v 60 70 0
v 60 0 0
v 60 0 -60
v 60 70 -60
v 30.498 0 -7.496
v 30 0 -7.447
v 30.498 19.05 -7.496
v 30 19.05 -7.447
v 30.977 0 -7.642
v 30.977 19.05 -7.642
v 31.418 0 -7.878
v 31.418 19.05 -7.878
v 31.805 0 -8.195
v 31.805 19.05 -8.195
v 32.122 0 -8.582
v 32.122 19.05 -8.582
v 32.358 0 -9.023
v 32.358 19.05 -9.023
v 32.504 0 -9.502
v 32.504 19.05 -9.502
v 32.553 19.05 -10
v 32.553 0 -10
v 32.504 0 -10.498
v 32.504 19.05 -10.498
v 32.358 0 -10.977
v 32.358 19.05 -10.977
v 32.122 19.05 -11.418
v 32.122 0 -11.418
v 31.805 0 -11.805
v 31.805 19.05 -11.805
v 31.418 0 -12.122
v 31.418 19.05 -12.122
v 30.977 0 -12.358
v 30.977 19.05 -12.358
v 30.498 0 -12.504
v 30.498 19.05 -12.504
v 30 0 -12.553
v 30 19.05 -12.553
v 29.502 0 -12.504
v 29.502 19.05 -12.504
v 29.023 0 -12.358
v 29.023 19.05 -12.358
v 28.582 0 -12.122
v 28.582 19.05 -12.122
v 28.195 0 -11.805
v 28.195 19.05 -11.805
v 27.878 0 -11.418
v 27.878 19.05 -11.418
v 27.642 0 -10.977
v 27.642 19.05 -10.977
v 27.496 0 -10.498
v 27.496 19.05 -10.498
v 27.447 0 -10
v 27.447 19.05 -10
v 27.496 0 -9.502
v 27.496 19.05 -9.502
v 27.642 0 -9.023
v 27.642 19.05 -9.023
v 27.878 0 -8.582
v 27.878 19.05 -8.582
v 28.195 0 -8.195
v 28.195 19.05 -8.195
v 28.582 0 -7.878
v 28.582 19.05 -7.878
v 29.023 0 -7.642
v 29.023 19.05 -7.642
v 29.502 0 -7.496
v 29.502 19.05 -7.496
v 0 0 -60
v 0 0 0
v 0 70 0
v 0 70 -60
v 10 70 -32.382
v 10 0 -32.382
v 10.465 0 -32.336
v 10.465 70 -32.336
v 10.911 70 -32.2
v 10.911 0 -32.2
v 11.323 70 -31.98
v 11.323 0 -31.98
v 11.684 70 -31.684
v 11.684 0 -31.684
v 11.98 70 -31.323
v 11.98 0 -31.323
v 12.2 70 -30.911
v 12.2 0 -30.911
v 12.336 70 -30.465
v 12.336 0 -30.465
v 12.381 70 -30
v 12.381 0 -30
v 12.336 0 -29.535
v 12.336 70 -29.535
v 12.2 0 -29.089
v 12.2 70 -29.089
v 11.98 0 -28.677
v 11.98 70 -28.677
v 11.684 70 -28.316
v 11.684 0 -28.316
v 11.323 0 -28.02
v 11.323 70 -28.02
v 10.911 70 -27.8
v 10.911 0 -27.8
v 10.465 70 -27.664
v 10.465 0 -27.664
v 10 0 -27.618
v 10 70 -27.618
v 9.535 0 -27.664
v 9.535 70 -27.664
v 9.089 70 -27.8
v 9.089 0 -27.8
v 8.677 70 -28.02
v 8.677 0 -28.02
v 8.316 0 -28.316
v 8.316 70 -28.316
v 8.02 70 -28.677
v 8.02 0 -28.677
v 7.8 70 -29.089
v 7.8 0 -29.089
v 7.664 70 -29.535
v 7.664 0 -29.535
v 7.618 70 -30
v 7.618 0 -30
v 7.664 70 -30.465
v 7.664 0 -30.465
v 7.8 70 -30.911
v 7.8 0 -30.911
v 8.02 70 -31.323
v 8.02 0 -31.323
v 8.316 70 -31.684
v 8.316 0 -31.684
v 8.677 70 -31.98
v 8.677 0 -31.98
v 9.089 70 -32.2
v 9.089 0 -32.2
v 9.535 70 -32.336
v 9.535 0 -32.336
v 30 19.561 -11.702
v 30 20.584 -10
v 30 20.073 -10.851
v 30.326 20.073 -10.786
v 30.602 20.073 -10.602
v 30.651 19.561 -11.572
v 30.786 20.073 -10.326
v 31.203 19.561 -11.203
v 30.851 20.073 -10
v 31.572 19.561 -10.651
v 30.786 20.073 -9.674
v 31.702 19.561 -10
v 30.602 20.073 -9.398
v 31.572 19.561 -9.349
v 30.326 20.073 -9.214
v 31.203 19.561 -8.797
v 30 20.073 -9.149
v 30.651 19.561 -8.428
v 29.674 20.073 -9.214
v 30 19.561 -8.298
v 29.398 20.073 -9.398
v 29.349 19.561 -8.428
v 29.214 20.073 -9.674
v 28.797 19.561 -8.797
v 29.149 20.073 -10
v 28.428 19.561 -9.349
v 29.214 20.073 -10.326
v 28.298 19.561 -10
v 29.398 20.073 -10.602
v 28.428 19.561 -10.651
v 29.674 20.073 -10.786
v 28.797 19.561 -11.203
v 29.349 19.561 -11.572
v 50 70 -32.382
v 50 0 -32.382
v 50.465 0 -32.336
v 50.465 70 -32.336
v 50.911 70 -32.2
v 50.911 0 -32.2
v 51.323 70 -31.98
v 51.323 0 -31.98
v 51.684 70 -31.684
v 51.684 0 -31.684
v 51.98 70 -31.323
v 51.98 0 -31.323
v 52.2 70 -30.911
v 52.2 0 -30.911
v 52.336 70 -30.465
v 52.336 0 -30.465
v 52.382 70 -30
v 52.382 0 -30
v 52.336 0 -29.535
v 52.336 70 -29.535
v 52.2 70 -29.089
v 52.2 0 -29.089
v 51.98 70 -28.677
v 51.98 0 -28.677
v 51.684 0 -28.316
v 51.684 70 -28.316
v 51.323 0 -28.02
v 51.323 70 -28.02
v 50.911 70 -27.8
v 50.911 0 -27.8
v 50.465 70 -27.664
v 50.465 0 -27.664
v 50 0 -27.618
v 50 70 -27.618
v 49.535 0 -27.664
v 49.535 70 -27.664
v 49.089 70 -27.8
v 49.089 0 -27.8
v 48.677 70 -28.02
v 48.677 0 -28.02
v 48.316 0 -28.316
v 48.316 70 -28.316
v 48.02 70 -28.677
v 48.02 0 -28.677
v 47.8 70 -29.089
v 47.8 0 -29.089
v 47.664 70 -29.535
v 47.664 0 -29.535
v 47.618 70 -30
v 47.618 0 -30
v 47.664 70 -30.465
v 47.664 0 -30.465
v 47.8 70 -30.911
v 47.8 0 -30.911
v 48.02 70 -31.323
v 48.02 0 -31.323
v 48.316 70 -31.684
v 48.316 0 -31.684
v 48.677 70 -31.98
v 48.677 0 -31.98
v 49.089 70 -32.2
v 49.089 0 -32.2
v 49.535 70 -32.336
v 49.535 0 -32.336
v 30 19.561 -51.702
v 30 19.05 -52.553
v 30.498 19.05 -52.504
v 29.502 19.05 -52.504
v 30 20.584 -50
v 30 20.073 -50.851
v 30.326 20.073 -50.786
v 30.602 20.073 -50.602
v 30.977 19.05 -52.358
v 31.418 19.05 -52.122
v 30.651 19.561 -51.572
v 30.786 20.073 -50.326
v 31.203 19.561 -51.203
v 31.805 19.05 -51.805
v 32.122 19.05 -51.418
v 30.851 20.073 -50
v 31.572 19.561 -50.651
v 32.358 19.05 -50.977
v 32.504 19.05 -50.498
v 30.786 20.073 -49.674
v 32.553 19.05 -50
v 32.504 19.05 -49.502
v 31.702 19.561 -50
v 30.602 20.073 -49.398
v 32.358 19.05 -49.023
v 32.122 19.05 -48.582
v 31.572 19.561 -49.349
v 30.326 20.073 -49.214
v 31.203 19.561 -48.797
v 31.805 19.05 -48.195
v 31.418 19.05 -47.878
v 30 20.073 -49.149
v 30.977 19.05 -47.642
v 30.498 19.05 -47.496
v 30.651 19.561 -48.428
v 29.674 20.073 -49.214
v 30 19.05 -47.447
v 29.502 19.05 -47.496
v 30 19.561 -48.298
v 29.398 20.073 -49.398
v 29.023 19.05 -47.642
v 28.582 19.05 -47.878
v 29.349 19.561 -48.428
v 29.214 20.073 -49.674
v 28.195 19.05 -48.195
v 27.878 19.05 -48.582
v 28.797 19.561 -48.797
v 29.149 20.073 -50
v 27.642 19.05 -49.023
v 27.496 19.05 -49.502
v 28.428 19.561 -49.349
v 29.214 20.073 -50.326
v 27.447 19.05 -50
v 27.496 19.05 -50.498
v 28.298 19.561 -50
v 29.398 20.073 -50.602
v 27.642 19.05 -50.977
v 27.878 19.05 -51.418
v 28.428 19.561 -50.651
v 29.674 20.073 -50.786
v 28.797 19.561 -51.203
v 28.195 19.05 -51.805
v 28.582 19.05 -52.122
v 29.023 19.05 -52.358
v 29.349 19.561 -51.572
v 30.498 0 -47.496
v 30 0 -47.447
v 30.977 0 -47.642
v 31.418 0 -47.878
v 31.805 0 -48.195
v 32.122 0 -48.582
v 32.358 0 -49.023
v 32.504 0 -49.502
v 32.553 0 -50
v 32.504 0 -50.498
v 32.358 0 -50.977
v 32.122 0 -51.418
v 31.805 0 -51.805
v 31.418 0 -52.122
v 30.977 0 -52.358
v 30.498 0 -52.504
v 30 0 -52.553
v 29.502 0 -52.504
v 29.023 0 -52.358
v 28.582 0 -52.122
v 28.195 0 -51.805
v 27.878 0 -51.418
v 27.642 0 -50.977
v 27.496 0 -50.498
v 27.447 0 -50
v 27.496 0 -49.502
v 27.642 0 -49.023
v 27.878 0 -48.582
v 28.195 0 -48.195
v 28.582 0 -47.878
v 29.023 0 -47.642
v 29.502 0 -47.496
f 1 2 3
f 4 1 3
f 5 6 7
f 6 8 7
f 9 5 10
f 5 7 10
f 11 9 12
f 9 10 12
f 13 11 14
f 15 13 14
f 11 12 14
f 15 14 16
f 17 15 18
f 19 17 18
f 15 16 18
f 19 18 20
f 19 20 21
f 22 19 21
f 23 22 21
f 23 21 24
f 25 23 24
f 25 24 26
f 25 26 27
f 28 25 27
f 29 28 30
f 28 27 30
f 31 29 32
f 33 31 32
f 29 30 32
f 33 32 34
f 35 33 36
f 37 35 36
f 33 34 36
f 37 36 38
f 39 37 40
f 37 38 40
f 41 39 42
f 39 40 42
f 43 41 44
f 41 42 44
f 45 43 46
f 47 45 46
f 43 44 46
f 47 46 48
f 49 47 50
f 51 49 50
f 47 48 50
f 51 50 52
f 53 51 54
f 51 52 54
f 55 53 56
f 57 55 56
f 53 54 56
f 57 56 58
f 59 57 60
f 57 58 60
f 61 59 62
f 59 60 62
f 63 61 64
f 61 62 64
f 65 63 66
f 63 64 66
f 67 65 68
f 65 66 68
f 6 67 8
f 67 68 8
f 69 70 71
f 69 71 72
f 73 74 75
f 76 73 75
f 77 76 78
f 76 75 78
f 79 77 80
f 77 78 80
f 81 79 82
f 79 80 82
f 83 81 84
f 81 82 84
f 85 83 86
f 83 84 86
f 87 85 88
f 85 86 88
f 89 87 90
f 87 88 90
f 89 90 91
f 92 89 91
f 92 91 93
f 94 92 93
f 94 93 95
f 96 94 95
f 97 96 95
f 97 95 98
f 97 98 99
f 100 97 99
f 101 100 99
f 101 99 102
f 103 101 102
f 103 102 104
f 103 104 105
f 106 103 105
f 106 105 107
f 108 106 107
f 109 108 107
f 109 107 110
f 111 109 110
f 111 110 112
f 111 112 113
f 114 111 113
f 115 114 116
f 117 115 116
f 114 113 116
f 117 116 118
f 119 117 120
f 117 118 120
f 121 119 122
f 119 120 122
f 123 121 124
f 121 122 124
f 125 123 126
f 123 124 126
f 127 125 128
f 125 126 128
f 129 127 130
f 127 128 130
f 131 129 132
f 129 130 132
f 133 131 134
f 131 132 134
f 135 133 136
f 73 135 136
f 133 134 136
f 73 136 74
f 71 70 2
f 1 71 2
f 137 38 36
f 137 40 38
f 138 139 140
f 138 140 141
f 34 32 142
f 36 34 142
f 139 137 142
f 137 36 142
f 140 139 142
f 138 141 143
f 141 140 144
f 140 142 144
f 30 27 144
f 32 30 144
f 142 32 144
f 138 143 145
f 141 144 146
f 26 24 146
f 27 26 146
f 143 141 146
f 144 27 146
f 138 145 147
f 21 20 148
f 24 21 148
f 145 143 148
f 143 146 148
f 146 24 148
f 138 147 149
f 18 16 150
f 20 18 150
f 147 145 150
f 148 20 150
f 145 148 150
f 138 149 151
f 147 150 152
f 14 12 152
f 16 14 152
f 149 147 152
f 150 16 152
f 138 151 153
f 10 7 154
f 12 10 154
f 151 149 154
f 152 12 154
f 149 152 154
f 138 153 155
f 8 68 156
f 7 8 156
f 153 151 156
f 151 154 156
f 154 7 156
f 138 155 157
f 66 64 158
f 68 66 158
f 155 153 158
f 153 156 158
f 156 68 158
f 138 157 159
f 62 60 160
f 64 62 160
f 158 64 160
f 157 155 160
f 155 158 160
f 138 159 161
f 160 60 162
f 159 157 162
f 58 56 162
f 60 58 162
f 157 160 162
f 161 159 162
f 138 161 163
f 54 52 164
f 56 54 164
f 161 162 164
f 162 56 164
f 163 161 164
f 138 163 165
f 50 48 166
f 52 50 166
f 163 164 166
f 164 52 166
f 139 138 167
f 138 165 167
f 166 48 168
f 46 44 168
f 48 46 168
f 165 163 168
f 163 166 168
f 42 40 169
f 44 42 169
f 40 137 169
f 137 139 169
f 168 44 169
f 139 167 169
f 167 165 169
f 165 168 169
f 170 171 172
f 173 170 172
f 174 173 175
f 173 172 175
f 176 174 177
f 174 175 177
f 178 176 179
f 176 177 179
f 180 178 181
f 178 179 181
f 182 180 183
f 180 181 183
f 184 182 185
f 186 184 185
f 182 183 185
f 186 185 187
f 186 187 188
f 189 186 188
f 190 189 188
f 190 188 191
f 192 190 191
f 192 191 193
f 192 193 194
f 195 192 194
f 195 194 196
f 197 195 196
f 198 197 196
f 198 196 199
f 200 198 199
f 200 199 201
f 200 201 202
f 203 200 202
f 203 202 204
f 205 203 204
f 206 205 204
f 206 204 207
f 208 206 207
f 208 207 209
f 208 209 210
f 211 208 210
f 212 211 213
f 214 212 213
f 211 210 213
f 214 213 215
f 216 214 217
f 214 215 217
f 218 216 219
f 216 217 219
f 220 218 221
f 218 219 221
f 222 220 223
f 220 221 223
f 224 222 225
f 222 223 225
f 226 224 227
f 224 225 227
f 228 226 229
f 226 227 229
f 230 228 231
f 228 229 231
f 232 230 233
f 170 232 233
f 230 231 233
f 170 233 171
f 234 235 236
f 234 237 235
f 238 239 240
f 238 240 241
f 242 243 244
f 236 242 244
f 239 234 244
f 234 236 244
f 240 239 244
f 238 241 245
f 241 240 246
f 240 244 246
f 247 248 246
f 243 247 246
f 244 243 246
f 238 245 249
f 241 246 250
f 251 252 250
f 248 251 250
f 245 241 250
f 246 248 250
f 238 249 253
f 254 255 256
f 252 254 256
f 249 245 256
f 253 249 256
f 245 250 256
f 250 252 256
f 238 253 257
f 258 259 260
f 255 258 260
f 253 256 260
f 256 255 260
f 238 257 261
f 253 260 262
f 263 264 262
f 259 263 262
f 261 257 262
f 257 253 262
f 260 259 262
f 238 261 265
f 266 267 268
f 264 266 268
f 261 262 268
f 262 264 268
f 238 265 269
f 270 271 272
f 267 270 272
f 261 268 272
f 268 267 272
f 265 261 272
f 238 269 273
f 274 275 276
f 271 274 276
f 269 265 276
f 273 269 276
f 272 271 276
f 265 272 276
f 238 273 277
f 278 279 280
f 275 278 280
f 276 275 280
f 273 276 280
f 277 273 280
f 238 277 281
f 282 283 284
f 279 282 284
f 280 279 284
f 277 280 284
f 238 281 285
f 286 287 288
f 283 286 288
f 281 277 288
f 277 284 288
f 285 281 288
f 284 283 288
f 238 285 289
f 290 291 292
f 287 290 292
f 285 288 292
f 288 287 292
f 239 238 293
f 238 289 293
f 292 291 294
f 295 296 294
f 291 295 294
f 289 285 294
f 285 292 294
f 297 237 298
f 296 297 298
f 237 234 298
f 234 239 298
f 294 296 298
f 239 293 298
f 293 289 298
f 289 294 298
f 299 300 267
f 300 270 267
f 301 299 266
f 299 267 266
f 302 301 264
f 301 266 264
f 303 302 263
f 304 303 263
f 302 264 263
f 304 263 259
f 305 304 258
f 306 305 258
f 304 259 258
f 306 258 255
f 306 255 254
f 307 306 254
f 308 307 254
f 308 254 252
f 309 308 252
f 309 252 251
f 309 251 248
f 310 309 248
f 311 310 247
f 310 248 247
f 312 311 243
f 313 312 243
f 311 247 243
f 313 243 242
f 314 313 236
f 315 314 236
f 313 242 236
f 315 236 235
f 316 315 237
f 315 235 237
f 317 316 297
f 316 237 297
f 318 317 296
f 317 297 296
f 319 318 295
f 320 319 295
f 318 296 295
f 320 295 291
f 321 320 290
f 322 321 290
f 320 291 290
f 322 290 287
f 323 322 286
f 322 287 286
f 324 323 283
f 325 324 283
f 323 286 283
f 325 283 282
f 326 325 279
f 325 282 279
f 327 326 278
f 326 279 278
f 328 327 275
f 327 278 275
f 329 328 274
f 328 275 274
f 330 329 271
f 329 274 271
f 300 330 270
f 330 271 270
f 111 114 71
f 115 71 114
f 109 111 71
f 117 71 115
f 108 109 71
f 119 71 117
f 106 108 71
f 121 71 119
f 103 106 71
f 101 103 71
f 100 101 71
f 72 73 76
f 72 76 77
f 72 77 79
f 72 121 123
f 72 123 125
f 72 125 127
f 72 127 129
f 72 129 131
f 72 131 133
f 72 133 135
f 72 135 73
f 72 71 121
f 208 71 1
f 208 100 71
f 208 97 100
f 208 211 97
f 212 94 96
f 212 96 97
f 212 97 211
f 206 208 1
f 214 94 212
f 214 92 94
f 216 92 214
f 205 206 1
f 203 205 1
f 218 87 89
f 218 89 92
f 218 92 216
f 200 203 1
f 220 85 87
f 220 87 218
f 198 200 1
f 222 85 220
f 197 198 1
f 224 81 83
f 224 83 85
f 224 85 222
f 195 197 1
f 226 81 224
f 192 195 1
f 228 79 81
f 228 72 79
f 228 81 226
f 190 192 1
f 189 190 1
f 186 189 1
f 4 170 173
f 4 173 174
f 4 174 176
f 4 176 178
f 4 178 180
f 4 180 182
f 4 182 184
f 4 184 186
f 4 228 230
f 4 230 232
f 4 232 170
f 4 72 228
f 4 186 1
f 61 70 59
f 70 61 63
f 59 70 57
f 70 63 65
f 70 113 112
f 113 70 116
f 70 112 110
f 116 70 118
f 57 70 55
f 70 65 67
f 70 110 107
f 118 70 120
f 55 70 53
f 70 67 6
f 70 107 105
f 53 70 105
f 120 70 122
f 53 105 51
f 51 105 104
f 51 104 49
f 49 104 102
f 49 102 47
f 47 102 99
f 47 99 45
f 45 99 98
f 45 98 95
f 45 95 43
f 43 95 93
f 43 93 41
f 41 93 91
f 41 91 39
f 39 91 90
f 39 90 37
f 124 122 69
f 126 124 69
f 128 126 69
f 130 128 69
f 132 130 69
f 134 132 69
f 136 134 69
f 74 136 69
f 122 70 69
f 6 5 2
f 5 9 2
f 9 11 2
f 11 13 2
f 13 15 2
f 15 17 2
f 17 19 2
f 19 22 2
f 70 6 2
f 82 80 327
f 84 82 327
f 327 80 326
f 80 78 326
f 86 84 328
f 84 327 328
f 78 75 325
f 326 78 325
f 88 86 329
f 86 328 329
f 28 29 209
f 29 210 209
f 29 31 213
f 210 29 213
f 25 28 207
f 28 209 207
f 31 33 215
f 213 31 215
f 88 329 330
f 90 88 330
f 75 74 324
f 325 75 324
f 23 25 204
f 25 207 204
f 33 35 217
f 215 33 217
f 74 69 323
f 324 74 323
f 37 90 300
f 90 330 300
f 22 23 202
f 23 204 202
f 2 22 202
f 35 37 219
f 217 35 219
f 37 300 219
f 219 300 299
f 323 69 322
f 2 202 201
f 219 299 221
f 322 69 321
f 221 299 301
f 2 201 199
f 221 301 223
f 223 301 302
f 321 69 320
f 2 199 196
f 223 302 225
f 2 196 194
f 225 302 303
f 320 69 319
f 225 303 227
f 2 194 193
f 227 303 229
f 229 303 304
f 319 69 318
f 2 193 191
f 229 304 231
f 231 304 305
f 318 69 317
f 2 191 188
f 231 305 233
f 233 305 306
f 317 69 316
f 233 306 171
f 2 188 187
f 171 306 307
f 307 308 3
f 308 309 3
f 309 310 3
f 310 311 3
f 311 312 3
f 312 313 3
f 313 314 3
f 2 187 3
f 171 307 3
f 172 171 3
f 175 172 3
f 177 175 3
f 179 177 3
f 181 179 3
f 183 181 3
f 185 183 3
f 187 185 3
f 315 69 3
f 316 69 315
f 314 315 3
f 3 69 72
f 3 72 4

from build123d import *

# Parameters (mm, degrees)
SKETCH1_W                   = 60
SKETCH1_H                   = 60
BOSS_EXTRUDE1_DEPTH         = 70
SKETCH2_R                   = 2.3815
CUT_EXTRUDE1_DEPTH          = 71
F_1_4_20_TAPPED_HOLE1_D     = 5.1054
F_1_4_20_TAPPED_HOLE1_DEPTH = 19.05
F_1_4_20_TAPPED_HOLE1_TIP   = 1.533816902


with BuildPart() as part:
    # Sketch1 → Boss-Extrude1 (new body)
    with BuildSketch(Plane(origin=(0, 0, 0), x_dir=(1, 0, 0), z_dir=(0, 1, 0))):
        with Locations((30, 30)):
            Rectangle(SKETCH1_W, SKETCH1_H)
    extrude(amount=BOSS_EXTRUDE1_DEPTH)

    # Sketch2 → Cut-Extrude1 (cut, through all)
    with BuildSketch(Plane.XZ):
        with Locations(Location((10, -30, 0), (0, 0, 270))):  # turned: the seam where the file's is
            Circle(SKETCH2_R)
        with Locations(Location((50, -30, 0), (0, 0, 270))):  # turned: the seam where the file's is
            Circle(SKETCH2_R)
    extrude(amount=-CUT_EXTRUDE1_DEPTH, mode=Mode.SUBTRACT)

    # 1/4-20 Tapped Hole1
    with Locations(Plane(origin=(30, 0, -10), x_dir=(0, 0, -1), z_dir=(0, -1, 0))):
        with Locations((0, 0), (40, 0)):
            Hole(F_1_4_20_TAPPED_HOLE1_D / 2, depth=F_1_4_20_TAPPED_HOLE1_DEPTH)
            with Locations((0, 0, -(F_1_4_20_TAPPED_HOLE1_DEPTH + F_1_4_20_TAPPED_HOLE1_TIP / 2))):  # 118° drill point
                Cone(0, F_1_4_20_TAPPED_HOLE1_D / 2, F_1_4_20_TAPPED_HOLE1_TIP, mode=Mode.SUBTRACT)


solid = part.part
